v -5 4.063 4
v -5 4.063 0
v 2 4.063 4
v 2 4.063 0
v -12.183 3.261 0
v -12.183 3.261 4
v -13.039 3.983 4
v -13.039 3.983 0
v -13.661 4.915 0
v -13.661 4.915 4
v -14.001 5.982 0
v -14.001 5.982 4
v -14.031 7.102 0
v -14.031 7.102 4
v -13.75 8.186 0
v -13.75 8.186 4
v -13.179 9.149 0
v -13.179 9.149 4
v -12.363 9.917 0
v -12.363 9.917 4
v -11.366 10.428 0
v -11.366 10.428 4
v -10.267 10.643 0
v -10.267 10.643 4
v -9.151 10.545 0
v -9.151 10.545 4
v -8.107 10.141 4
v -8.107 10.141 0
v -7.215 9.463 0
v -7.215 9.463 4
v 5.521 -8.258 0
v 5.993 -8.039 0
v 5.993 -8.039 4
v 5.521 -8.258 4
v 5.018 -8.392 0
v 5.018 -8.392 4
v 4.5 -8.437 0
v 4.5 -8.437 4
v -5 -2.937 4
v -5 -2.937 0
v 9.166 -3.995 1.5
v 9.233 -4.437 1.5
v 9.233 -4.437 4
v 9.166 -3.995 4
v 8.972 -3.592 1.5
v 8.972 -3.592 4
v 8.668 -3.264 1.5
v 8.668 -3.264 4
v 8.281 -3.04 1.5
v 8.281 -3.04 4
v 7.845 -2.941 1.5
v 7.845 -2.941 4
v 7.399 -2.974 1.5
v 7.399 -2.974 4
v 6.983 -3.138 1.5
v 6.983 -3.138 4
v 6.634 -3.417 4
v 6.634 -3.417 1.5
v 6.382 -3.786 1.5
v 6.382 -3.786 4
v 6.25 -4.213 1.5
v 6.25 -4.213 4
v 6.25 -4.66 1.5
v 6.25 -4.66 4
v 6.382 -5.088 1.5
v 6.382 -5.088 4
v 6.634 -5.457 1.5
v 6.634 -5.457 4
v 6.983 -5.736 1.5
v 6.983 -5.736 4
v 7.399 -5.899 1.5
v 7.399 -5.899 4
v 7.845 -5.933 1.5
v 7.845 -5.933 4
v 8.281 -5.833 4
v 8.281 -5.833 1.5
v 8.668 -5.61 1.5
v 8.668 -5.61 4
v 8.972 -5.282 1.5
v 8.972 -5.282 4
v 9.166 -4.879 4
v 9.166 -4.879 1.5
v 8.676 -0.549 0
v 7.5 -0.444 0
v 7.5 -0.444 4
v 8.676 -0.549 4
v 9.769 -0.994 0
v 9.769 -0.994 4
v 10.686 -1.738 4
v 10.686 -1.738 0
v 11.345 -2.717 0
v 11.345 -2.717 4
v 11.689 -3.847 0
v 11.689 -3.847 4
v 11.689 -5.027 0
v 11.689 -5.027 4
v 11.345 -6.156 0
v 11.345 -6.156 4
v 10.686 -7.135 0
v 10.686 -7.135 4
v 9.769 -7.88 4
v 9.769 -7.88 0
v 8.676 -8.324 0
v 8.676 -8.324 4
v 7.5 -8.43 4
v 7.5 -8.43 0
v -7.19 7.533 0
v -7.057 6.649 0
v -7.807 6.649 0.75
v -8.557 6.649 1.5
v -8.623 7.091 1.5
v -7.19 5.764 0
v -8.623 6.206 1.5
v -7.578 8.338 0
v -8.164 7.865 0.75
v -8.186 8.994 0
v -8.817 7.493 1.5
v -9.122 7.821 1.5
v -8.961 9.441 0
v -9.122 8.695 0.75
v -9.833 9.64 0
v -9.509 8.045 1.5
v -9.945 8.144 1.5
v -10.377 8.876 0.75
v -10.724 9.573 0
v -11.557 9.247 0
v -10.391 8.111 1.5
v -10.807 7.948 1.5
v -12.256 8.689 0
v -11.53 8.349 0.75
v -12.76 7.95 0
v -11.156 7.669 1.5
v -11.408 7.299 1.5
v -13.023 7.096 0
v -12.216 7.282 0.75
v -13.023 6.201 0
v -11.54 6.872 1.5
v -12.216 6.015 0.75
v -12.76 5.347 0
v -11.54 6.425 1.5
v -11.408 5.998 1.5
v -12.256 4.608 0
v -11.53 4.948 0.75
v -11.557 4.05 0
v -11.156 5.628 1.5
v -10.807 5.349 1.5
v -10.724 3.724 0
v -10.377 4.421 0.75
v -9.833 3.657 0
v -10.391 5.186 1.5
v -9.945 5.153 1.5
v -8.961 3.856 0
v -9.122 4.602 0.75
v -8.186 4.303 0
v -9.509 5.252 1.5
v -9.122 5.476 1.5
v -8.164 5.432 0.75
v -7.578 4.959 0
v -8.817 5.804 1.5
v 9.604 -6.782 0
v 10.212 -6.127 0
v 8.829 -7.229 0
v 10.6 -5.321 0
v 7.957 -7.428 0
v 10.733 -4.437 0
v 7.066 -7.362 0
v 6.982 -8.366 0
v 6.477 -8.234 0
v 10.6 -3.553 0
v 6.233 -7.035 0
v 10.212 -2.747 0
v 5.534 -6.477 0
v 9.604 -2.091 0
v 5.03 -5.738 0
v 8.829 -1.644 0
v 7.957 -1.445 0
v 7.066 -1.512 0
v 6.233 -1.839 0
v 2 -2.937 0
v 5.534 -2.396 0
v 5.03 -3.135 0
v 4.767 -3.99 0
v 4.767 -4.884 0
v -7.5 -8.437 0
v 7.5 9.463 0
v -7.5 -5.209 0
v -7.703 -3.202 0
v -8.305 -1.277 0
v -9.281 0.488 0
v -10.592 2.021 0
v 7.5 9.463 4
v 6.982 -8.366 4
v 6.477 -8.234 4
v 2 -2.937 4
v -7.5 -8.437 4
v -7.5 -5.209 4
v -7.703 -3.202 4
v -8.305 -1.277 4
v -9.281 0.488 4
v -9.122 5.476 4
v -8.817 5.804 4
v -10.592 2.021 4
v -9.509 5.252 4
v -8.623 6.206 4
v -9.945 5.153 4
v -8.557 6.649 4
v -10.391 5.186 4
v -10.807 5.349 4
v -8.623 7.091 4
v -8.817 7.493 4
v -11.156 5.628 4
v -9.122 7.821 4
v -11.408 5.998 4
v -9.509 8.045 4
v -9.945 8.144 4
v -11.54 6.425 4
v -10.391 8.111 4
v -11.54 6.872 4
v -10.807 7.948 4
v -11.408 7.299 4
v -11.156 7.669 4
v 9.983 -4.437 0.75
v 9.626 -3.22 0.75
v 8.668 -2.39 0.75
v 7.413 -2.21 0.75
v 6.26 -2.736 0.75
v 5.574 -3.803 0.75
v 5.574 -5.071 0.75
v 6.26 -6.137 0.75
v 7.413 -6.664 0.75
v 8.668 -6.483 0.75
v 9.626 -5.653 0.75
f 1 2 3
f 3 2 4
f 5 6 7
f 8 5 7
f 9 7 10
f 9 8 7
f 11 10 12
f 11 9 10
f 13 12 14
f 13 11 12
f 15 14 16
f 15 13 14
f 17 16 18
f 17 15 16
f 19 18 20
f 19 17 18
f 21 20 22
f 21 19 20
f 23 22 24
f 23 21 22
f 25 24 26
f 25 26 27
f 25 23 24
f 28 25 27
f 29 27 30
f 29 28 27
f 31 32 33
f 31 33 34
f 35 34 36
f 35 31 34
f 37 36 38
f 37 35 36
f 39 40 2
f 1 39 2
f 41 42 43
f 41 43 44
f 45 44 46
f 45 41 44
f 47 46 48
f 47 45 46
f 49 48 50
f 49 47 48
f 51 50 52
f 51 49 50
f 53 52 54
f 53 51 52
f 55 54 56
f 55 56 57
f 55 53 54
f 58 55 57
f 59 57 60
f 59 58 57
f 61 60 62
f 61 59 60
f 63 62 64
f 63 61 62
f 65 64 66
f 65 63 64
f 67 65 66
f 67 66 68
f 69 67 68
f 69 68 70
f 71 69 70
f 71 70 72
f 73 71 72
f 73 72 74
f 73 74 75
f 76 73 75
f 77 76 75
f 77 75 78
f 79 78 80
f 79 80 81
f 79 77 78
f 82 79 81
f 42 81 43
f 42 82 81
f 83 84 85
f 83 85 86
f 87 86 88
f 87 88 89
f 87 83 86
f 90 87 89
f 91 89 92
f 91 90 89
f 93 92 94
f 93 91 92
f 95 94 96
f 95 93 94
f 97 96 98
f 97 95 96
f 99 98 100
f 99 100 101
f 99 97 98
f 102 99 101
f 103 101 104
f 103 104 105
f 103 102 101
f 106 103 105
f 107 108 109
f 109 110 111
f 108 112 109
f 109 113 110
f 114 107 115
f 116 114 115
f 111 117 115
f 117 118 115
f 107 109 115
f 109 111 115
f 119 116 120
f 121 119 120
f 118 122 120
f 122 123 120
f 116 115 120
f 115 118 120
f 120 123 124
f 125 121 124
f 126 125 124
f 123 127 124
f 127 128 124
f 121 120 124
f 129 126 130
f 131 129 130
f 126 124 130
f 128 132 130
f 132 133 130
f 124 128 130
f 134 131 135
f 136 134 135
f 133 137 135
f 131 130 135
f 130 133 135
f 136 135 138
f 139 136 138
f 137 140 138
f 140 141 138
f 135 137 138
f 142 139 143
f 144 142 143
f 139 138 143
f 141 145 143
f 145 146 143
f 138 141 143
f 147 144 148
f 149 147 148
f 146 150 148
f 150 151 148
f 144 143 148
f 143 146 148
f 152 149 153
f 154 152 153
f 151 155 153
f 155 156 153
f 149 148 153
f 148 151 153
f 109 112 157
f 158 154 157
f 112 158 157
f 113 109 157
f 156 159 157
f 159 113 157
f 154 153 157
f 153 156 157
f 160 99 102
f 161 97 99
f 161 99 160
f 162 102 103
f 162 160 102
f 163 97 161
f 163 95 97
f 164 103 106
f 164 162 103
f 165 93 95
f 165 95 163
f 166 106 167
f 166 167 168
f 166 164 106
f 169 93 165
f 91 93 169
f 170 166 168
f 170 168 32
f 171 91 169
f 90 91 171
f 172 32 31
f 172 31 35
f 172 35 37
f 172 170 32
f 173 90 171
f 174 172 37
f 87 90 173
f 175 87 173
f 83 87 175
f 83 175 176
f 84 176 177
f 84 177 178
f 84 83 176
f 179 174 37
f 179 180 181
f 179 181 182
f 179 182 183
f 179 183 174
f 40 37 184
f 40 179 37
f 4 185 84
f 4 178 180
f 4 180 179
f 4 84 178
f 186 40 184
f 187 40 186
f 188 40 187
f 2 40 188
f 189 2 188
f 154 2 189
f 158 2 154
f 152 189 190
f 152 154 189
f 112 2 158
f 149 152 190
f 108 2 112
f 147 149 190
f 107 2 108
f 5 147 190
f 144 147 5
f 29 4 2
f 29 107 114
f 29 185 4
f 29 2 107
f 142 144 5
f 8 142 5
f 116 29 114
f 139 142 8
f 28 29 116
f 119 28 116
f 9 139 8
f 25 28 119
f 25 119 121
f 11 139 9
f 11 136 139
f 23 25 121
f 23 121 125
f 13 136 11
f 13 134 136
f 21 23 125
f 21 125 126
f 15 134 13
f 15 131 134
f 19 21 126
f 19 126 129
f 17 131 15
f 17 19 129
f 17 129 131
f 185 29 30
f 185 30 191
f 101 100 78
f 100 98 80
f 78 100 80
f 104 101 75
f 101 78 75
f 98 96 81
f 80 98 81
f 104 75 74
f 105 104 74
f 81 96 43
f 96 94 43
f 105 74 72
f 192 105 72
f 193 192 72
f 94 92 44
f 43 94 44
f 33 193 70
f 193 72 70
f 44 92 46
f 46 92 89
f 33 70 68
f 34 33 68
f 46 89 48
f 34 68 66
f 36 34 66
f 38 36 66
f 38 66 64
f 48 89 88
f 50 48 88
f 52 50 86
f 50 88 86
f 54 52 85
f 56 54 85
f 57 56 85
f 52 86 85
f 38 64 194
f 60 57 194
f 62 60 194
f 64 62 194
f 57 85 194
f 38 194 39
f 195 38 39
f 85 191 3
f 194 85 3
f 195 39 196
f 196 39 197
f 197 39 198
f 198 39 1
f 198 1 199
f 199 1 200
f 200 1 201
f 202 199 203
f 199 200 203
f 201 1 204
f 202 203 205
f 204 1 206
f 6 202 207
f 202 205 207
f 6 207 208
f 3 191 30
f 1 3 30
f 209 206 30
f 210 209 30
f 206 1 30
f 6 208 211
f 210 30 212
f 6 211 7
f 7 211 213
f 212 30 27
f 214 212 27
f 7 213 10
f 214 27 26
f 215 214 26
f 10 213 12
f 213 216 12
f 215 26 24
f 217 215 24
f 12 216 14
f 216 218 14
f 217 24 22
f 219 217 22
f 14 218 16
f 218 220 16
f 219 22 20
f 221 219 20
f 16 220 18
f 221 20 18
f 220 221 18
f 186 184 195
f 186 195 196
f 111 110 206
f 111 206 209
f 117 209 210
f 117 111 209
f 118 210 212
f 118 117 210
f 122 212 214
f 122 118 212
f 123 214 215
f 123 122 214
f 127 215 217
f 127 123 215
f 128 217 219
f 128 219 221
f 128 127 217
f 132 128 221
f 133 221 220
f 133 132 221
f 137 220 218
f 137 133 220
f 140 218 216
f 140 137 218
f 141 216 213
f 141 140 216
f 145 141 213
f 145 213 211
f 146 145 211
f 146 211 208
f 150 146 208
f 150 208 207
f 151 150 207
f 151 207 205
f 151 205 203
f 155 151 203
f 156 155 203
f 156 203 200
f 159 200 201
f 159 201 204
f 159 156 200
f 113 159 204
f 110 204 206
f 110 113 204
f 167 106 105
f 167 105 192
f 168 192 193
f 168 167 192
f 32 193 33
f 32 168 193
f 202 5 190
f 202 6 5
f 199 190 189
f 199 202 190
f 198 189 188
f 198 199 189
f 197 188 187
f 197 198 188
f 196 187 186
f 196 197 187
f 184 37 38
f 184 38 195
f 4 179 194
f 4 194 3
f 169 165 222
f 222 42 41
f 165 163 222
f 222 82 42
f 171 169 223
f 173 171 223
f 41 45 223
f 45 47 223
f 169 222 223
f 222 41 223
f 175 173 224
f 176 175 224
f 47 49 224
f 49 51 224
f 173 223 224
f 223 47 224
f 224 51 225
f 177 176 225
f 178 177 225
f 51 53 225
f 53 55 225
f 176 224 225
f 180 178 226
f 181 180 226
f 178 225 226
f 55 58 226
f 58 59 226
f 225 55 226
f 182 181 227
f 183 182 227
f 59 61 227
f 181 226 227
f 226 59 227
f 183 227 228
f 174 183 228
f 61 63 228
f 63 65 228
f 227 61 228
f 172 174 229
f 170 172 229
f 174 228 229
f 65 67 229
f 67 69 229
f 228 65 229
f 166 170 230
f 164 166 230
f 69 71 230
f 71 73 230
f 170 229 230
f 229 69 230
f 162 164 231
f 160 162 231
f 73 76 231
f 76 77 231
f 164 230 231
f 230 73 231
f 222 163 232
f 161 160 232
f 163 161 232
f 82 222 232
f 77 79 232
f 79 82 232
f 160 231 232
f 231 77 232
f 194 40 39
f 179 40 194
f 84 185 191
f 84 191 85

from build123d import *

# Parameters (mm, degrees)
SKETCH_1_R          = 1.5
SKETCH_1_W          = 7
SKETCH_1_H          = 7
EXTRUDE_1_DEPTH     = 4
CUT_EXTRUDE_1_DEPTH = 5
FILLET_1_R          = 10
CHAMFER_1_SIZE      = 1.5


with BuildPart() as part:
    # Эскиз1 → Бобышка-Вытянуть1 (new body)
    with BuildSketch(Plane.XY):
        with BuildLine():
            Line((7.5, -9.463206067), (-7.5, -9.463206067))
            Line((-7.5, -9.463206067), (-7.5, 3.572357891))
            ThreePointArc((-7.5, 3.572357891), (-14.05213631, 6.841981187), (-7.21473133, 9.463206067))
            Line((-7.21473133, 9.463206067), (7.5, 9.463206067))
            Line((7.5, 9.463206067), (7.5, -0.443591232))
            ThreePointArc((7.5, -0.443591232), (11.733092656, -4.436793933), (7.5, -8.429996634))
            Line((7.5, -8.429996634), (7.5, -9.463206067))
        make_face()
        with Locations((7.733092656, -4.436793933)):
            Circle(SKETCH_1_R, mode=Mode.SUBTRACT)
        with Locations((-10.056818182, 6.648504959)):
            Circle(SKETCH_1_R, mode=Mode.SUBTRACT)
        with Locations((-1.5, 0.563206067)):
            Rectangle(SKETCH_1_W, SKETCH_1_H, mode=Mode.SUBTRACT)
    extrude(amount=EXTRUDE_1_DEPTH)

    # Эскиз2 → Вырез-Вытянуть1 (cut, through all)
    with BuildSketch(Plane(origin=(0, 0, 0), x_dir=(-1, 0, 0), z_dir=(0, 0, -1))):
        with BuildLine():
            Line((7.5, -9.463206067), (-7.5, -9.463206067))
            Line((-7.5, -9.463206067), (-7.5, -8.429996634))
            ThreePointArc((-7.5, -8.429996634), (-6.727483224, -8.308324595), (-5.993405004, -8.038666623))
            ThreePointArc((-5.993405004, -8.038666623), (-5.272781318, -8.335553846), (-4.5, -8.436793933))
            Line((-4.5, -8.436793933), (7.5, -8.436793933))
            Line((7.5, -8.436793933), (7.5, -9.463206067))
        make_face()
    extrude(amount=-CUT_EXTRUDE_1_DEPTH, mode=Mode.SUBTRACT)

    # Скругление1
    fillet_1_edges = [part.edges().sort_by_distance(p)[0] for p in [
        (-7.5, 3.572357891, 2),
    ]]
    fillet(fillet_1_edges, radius=FILLET_1_R)

    # Фаска1
    chamfer_1_edges = [part.edges().sort_by_distance(p)[0] for p in [
        (6.233092656, -4.436793933, 0),
        (-11.556818182, 6.648504959, 0),
    ]]
    chamfer(chamfer_1_edges, length=CHAMFER_1_SIZE)


solid = part.part
